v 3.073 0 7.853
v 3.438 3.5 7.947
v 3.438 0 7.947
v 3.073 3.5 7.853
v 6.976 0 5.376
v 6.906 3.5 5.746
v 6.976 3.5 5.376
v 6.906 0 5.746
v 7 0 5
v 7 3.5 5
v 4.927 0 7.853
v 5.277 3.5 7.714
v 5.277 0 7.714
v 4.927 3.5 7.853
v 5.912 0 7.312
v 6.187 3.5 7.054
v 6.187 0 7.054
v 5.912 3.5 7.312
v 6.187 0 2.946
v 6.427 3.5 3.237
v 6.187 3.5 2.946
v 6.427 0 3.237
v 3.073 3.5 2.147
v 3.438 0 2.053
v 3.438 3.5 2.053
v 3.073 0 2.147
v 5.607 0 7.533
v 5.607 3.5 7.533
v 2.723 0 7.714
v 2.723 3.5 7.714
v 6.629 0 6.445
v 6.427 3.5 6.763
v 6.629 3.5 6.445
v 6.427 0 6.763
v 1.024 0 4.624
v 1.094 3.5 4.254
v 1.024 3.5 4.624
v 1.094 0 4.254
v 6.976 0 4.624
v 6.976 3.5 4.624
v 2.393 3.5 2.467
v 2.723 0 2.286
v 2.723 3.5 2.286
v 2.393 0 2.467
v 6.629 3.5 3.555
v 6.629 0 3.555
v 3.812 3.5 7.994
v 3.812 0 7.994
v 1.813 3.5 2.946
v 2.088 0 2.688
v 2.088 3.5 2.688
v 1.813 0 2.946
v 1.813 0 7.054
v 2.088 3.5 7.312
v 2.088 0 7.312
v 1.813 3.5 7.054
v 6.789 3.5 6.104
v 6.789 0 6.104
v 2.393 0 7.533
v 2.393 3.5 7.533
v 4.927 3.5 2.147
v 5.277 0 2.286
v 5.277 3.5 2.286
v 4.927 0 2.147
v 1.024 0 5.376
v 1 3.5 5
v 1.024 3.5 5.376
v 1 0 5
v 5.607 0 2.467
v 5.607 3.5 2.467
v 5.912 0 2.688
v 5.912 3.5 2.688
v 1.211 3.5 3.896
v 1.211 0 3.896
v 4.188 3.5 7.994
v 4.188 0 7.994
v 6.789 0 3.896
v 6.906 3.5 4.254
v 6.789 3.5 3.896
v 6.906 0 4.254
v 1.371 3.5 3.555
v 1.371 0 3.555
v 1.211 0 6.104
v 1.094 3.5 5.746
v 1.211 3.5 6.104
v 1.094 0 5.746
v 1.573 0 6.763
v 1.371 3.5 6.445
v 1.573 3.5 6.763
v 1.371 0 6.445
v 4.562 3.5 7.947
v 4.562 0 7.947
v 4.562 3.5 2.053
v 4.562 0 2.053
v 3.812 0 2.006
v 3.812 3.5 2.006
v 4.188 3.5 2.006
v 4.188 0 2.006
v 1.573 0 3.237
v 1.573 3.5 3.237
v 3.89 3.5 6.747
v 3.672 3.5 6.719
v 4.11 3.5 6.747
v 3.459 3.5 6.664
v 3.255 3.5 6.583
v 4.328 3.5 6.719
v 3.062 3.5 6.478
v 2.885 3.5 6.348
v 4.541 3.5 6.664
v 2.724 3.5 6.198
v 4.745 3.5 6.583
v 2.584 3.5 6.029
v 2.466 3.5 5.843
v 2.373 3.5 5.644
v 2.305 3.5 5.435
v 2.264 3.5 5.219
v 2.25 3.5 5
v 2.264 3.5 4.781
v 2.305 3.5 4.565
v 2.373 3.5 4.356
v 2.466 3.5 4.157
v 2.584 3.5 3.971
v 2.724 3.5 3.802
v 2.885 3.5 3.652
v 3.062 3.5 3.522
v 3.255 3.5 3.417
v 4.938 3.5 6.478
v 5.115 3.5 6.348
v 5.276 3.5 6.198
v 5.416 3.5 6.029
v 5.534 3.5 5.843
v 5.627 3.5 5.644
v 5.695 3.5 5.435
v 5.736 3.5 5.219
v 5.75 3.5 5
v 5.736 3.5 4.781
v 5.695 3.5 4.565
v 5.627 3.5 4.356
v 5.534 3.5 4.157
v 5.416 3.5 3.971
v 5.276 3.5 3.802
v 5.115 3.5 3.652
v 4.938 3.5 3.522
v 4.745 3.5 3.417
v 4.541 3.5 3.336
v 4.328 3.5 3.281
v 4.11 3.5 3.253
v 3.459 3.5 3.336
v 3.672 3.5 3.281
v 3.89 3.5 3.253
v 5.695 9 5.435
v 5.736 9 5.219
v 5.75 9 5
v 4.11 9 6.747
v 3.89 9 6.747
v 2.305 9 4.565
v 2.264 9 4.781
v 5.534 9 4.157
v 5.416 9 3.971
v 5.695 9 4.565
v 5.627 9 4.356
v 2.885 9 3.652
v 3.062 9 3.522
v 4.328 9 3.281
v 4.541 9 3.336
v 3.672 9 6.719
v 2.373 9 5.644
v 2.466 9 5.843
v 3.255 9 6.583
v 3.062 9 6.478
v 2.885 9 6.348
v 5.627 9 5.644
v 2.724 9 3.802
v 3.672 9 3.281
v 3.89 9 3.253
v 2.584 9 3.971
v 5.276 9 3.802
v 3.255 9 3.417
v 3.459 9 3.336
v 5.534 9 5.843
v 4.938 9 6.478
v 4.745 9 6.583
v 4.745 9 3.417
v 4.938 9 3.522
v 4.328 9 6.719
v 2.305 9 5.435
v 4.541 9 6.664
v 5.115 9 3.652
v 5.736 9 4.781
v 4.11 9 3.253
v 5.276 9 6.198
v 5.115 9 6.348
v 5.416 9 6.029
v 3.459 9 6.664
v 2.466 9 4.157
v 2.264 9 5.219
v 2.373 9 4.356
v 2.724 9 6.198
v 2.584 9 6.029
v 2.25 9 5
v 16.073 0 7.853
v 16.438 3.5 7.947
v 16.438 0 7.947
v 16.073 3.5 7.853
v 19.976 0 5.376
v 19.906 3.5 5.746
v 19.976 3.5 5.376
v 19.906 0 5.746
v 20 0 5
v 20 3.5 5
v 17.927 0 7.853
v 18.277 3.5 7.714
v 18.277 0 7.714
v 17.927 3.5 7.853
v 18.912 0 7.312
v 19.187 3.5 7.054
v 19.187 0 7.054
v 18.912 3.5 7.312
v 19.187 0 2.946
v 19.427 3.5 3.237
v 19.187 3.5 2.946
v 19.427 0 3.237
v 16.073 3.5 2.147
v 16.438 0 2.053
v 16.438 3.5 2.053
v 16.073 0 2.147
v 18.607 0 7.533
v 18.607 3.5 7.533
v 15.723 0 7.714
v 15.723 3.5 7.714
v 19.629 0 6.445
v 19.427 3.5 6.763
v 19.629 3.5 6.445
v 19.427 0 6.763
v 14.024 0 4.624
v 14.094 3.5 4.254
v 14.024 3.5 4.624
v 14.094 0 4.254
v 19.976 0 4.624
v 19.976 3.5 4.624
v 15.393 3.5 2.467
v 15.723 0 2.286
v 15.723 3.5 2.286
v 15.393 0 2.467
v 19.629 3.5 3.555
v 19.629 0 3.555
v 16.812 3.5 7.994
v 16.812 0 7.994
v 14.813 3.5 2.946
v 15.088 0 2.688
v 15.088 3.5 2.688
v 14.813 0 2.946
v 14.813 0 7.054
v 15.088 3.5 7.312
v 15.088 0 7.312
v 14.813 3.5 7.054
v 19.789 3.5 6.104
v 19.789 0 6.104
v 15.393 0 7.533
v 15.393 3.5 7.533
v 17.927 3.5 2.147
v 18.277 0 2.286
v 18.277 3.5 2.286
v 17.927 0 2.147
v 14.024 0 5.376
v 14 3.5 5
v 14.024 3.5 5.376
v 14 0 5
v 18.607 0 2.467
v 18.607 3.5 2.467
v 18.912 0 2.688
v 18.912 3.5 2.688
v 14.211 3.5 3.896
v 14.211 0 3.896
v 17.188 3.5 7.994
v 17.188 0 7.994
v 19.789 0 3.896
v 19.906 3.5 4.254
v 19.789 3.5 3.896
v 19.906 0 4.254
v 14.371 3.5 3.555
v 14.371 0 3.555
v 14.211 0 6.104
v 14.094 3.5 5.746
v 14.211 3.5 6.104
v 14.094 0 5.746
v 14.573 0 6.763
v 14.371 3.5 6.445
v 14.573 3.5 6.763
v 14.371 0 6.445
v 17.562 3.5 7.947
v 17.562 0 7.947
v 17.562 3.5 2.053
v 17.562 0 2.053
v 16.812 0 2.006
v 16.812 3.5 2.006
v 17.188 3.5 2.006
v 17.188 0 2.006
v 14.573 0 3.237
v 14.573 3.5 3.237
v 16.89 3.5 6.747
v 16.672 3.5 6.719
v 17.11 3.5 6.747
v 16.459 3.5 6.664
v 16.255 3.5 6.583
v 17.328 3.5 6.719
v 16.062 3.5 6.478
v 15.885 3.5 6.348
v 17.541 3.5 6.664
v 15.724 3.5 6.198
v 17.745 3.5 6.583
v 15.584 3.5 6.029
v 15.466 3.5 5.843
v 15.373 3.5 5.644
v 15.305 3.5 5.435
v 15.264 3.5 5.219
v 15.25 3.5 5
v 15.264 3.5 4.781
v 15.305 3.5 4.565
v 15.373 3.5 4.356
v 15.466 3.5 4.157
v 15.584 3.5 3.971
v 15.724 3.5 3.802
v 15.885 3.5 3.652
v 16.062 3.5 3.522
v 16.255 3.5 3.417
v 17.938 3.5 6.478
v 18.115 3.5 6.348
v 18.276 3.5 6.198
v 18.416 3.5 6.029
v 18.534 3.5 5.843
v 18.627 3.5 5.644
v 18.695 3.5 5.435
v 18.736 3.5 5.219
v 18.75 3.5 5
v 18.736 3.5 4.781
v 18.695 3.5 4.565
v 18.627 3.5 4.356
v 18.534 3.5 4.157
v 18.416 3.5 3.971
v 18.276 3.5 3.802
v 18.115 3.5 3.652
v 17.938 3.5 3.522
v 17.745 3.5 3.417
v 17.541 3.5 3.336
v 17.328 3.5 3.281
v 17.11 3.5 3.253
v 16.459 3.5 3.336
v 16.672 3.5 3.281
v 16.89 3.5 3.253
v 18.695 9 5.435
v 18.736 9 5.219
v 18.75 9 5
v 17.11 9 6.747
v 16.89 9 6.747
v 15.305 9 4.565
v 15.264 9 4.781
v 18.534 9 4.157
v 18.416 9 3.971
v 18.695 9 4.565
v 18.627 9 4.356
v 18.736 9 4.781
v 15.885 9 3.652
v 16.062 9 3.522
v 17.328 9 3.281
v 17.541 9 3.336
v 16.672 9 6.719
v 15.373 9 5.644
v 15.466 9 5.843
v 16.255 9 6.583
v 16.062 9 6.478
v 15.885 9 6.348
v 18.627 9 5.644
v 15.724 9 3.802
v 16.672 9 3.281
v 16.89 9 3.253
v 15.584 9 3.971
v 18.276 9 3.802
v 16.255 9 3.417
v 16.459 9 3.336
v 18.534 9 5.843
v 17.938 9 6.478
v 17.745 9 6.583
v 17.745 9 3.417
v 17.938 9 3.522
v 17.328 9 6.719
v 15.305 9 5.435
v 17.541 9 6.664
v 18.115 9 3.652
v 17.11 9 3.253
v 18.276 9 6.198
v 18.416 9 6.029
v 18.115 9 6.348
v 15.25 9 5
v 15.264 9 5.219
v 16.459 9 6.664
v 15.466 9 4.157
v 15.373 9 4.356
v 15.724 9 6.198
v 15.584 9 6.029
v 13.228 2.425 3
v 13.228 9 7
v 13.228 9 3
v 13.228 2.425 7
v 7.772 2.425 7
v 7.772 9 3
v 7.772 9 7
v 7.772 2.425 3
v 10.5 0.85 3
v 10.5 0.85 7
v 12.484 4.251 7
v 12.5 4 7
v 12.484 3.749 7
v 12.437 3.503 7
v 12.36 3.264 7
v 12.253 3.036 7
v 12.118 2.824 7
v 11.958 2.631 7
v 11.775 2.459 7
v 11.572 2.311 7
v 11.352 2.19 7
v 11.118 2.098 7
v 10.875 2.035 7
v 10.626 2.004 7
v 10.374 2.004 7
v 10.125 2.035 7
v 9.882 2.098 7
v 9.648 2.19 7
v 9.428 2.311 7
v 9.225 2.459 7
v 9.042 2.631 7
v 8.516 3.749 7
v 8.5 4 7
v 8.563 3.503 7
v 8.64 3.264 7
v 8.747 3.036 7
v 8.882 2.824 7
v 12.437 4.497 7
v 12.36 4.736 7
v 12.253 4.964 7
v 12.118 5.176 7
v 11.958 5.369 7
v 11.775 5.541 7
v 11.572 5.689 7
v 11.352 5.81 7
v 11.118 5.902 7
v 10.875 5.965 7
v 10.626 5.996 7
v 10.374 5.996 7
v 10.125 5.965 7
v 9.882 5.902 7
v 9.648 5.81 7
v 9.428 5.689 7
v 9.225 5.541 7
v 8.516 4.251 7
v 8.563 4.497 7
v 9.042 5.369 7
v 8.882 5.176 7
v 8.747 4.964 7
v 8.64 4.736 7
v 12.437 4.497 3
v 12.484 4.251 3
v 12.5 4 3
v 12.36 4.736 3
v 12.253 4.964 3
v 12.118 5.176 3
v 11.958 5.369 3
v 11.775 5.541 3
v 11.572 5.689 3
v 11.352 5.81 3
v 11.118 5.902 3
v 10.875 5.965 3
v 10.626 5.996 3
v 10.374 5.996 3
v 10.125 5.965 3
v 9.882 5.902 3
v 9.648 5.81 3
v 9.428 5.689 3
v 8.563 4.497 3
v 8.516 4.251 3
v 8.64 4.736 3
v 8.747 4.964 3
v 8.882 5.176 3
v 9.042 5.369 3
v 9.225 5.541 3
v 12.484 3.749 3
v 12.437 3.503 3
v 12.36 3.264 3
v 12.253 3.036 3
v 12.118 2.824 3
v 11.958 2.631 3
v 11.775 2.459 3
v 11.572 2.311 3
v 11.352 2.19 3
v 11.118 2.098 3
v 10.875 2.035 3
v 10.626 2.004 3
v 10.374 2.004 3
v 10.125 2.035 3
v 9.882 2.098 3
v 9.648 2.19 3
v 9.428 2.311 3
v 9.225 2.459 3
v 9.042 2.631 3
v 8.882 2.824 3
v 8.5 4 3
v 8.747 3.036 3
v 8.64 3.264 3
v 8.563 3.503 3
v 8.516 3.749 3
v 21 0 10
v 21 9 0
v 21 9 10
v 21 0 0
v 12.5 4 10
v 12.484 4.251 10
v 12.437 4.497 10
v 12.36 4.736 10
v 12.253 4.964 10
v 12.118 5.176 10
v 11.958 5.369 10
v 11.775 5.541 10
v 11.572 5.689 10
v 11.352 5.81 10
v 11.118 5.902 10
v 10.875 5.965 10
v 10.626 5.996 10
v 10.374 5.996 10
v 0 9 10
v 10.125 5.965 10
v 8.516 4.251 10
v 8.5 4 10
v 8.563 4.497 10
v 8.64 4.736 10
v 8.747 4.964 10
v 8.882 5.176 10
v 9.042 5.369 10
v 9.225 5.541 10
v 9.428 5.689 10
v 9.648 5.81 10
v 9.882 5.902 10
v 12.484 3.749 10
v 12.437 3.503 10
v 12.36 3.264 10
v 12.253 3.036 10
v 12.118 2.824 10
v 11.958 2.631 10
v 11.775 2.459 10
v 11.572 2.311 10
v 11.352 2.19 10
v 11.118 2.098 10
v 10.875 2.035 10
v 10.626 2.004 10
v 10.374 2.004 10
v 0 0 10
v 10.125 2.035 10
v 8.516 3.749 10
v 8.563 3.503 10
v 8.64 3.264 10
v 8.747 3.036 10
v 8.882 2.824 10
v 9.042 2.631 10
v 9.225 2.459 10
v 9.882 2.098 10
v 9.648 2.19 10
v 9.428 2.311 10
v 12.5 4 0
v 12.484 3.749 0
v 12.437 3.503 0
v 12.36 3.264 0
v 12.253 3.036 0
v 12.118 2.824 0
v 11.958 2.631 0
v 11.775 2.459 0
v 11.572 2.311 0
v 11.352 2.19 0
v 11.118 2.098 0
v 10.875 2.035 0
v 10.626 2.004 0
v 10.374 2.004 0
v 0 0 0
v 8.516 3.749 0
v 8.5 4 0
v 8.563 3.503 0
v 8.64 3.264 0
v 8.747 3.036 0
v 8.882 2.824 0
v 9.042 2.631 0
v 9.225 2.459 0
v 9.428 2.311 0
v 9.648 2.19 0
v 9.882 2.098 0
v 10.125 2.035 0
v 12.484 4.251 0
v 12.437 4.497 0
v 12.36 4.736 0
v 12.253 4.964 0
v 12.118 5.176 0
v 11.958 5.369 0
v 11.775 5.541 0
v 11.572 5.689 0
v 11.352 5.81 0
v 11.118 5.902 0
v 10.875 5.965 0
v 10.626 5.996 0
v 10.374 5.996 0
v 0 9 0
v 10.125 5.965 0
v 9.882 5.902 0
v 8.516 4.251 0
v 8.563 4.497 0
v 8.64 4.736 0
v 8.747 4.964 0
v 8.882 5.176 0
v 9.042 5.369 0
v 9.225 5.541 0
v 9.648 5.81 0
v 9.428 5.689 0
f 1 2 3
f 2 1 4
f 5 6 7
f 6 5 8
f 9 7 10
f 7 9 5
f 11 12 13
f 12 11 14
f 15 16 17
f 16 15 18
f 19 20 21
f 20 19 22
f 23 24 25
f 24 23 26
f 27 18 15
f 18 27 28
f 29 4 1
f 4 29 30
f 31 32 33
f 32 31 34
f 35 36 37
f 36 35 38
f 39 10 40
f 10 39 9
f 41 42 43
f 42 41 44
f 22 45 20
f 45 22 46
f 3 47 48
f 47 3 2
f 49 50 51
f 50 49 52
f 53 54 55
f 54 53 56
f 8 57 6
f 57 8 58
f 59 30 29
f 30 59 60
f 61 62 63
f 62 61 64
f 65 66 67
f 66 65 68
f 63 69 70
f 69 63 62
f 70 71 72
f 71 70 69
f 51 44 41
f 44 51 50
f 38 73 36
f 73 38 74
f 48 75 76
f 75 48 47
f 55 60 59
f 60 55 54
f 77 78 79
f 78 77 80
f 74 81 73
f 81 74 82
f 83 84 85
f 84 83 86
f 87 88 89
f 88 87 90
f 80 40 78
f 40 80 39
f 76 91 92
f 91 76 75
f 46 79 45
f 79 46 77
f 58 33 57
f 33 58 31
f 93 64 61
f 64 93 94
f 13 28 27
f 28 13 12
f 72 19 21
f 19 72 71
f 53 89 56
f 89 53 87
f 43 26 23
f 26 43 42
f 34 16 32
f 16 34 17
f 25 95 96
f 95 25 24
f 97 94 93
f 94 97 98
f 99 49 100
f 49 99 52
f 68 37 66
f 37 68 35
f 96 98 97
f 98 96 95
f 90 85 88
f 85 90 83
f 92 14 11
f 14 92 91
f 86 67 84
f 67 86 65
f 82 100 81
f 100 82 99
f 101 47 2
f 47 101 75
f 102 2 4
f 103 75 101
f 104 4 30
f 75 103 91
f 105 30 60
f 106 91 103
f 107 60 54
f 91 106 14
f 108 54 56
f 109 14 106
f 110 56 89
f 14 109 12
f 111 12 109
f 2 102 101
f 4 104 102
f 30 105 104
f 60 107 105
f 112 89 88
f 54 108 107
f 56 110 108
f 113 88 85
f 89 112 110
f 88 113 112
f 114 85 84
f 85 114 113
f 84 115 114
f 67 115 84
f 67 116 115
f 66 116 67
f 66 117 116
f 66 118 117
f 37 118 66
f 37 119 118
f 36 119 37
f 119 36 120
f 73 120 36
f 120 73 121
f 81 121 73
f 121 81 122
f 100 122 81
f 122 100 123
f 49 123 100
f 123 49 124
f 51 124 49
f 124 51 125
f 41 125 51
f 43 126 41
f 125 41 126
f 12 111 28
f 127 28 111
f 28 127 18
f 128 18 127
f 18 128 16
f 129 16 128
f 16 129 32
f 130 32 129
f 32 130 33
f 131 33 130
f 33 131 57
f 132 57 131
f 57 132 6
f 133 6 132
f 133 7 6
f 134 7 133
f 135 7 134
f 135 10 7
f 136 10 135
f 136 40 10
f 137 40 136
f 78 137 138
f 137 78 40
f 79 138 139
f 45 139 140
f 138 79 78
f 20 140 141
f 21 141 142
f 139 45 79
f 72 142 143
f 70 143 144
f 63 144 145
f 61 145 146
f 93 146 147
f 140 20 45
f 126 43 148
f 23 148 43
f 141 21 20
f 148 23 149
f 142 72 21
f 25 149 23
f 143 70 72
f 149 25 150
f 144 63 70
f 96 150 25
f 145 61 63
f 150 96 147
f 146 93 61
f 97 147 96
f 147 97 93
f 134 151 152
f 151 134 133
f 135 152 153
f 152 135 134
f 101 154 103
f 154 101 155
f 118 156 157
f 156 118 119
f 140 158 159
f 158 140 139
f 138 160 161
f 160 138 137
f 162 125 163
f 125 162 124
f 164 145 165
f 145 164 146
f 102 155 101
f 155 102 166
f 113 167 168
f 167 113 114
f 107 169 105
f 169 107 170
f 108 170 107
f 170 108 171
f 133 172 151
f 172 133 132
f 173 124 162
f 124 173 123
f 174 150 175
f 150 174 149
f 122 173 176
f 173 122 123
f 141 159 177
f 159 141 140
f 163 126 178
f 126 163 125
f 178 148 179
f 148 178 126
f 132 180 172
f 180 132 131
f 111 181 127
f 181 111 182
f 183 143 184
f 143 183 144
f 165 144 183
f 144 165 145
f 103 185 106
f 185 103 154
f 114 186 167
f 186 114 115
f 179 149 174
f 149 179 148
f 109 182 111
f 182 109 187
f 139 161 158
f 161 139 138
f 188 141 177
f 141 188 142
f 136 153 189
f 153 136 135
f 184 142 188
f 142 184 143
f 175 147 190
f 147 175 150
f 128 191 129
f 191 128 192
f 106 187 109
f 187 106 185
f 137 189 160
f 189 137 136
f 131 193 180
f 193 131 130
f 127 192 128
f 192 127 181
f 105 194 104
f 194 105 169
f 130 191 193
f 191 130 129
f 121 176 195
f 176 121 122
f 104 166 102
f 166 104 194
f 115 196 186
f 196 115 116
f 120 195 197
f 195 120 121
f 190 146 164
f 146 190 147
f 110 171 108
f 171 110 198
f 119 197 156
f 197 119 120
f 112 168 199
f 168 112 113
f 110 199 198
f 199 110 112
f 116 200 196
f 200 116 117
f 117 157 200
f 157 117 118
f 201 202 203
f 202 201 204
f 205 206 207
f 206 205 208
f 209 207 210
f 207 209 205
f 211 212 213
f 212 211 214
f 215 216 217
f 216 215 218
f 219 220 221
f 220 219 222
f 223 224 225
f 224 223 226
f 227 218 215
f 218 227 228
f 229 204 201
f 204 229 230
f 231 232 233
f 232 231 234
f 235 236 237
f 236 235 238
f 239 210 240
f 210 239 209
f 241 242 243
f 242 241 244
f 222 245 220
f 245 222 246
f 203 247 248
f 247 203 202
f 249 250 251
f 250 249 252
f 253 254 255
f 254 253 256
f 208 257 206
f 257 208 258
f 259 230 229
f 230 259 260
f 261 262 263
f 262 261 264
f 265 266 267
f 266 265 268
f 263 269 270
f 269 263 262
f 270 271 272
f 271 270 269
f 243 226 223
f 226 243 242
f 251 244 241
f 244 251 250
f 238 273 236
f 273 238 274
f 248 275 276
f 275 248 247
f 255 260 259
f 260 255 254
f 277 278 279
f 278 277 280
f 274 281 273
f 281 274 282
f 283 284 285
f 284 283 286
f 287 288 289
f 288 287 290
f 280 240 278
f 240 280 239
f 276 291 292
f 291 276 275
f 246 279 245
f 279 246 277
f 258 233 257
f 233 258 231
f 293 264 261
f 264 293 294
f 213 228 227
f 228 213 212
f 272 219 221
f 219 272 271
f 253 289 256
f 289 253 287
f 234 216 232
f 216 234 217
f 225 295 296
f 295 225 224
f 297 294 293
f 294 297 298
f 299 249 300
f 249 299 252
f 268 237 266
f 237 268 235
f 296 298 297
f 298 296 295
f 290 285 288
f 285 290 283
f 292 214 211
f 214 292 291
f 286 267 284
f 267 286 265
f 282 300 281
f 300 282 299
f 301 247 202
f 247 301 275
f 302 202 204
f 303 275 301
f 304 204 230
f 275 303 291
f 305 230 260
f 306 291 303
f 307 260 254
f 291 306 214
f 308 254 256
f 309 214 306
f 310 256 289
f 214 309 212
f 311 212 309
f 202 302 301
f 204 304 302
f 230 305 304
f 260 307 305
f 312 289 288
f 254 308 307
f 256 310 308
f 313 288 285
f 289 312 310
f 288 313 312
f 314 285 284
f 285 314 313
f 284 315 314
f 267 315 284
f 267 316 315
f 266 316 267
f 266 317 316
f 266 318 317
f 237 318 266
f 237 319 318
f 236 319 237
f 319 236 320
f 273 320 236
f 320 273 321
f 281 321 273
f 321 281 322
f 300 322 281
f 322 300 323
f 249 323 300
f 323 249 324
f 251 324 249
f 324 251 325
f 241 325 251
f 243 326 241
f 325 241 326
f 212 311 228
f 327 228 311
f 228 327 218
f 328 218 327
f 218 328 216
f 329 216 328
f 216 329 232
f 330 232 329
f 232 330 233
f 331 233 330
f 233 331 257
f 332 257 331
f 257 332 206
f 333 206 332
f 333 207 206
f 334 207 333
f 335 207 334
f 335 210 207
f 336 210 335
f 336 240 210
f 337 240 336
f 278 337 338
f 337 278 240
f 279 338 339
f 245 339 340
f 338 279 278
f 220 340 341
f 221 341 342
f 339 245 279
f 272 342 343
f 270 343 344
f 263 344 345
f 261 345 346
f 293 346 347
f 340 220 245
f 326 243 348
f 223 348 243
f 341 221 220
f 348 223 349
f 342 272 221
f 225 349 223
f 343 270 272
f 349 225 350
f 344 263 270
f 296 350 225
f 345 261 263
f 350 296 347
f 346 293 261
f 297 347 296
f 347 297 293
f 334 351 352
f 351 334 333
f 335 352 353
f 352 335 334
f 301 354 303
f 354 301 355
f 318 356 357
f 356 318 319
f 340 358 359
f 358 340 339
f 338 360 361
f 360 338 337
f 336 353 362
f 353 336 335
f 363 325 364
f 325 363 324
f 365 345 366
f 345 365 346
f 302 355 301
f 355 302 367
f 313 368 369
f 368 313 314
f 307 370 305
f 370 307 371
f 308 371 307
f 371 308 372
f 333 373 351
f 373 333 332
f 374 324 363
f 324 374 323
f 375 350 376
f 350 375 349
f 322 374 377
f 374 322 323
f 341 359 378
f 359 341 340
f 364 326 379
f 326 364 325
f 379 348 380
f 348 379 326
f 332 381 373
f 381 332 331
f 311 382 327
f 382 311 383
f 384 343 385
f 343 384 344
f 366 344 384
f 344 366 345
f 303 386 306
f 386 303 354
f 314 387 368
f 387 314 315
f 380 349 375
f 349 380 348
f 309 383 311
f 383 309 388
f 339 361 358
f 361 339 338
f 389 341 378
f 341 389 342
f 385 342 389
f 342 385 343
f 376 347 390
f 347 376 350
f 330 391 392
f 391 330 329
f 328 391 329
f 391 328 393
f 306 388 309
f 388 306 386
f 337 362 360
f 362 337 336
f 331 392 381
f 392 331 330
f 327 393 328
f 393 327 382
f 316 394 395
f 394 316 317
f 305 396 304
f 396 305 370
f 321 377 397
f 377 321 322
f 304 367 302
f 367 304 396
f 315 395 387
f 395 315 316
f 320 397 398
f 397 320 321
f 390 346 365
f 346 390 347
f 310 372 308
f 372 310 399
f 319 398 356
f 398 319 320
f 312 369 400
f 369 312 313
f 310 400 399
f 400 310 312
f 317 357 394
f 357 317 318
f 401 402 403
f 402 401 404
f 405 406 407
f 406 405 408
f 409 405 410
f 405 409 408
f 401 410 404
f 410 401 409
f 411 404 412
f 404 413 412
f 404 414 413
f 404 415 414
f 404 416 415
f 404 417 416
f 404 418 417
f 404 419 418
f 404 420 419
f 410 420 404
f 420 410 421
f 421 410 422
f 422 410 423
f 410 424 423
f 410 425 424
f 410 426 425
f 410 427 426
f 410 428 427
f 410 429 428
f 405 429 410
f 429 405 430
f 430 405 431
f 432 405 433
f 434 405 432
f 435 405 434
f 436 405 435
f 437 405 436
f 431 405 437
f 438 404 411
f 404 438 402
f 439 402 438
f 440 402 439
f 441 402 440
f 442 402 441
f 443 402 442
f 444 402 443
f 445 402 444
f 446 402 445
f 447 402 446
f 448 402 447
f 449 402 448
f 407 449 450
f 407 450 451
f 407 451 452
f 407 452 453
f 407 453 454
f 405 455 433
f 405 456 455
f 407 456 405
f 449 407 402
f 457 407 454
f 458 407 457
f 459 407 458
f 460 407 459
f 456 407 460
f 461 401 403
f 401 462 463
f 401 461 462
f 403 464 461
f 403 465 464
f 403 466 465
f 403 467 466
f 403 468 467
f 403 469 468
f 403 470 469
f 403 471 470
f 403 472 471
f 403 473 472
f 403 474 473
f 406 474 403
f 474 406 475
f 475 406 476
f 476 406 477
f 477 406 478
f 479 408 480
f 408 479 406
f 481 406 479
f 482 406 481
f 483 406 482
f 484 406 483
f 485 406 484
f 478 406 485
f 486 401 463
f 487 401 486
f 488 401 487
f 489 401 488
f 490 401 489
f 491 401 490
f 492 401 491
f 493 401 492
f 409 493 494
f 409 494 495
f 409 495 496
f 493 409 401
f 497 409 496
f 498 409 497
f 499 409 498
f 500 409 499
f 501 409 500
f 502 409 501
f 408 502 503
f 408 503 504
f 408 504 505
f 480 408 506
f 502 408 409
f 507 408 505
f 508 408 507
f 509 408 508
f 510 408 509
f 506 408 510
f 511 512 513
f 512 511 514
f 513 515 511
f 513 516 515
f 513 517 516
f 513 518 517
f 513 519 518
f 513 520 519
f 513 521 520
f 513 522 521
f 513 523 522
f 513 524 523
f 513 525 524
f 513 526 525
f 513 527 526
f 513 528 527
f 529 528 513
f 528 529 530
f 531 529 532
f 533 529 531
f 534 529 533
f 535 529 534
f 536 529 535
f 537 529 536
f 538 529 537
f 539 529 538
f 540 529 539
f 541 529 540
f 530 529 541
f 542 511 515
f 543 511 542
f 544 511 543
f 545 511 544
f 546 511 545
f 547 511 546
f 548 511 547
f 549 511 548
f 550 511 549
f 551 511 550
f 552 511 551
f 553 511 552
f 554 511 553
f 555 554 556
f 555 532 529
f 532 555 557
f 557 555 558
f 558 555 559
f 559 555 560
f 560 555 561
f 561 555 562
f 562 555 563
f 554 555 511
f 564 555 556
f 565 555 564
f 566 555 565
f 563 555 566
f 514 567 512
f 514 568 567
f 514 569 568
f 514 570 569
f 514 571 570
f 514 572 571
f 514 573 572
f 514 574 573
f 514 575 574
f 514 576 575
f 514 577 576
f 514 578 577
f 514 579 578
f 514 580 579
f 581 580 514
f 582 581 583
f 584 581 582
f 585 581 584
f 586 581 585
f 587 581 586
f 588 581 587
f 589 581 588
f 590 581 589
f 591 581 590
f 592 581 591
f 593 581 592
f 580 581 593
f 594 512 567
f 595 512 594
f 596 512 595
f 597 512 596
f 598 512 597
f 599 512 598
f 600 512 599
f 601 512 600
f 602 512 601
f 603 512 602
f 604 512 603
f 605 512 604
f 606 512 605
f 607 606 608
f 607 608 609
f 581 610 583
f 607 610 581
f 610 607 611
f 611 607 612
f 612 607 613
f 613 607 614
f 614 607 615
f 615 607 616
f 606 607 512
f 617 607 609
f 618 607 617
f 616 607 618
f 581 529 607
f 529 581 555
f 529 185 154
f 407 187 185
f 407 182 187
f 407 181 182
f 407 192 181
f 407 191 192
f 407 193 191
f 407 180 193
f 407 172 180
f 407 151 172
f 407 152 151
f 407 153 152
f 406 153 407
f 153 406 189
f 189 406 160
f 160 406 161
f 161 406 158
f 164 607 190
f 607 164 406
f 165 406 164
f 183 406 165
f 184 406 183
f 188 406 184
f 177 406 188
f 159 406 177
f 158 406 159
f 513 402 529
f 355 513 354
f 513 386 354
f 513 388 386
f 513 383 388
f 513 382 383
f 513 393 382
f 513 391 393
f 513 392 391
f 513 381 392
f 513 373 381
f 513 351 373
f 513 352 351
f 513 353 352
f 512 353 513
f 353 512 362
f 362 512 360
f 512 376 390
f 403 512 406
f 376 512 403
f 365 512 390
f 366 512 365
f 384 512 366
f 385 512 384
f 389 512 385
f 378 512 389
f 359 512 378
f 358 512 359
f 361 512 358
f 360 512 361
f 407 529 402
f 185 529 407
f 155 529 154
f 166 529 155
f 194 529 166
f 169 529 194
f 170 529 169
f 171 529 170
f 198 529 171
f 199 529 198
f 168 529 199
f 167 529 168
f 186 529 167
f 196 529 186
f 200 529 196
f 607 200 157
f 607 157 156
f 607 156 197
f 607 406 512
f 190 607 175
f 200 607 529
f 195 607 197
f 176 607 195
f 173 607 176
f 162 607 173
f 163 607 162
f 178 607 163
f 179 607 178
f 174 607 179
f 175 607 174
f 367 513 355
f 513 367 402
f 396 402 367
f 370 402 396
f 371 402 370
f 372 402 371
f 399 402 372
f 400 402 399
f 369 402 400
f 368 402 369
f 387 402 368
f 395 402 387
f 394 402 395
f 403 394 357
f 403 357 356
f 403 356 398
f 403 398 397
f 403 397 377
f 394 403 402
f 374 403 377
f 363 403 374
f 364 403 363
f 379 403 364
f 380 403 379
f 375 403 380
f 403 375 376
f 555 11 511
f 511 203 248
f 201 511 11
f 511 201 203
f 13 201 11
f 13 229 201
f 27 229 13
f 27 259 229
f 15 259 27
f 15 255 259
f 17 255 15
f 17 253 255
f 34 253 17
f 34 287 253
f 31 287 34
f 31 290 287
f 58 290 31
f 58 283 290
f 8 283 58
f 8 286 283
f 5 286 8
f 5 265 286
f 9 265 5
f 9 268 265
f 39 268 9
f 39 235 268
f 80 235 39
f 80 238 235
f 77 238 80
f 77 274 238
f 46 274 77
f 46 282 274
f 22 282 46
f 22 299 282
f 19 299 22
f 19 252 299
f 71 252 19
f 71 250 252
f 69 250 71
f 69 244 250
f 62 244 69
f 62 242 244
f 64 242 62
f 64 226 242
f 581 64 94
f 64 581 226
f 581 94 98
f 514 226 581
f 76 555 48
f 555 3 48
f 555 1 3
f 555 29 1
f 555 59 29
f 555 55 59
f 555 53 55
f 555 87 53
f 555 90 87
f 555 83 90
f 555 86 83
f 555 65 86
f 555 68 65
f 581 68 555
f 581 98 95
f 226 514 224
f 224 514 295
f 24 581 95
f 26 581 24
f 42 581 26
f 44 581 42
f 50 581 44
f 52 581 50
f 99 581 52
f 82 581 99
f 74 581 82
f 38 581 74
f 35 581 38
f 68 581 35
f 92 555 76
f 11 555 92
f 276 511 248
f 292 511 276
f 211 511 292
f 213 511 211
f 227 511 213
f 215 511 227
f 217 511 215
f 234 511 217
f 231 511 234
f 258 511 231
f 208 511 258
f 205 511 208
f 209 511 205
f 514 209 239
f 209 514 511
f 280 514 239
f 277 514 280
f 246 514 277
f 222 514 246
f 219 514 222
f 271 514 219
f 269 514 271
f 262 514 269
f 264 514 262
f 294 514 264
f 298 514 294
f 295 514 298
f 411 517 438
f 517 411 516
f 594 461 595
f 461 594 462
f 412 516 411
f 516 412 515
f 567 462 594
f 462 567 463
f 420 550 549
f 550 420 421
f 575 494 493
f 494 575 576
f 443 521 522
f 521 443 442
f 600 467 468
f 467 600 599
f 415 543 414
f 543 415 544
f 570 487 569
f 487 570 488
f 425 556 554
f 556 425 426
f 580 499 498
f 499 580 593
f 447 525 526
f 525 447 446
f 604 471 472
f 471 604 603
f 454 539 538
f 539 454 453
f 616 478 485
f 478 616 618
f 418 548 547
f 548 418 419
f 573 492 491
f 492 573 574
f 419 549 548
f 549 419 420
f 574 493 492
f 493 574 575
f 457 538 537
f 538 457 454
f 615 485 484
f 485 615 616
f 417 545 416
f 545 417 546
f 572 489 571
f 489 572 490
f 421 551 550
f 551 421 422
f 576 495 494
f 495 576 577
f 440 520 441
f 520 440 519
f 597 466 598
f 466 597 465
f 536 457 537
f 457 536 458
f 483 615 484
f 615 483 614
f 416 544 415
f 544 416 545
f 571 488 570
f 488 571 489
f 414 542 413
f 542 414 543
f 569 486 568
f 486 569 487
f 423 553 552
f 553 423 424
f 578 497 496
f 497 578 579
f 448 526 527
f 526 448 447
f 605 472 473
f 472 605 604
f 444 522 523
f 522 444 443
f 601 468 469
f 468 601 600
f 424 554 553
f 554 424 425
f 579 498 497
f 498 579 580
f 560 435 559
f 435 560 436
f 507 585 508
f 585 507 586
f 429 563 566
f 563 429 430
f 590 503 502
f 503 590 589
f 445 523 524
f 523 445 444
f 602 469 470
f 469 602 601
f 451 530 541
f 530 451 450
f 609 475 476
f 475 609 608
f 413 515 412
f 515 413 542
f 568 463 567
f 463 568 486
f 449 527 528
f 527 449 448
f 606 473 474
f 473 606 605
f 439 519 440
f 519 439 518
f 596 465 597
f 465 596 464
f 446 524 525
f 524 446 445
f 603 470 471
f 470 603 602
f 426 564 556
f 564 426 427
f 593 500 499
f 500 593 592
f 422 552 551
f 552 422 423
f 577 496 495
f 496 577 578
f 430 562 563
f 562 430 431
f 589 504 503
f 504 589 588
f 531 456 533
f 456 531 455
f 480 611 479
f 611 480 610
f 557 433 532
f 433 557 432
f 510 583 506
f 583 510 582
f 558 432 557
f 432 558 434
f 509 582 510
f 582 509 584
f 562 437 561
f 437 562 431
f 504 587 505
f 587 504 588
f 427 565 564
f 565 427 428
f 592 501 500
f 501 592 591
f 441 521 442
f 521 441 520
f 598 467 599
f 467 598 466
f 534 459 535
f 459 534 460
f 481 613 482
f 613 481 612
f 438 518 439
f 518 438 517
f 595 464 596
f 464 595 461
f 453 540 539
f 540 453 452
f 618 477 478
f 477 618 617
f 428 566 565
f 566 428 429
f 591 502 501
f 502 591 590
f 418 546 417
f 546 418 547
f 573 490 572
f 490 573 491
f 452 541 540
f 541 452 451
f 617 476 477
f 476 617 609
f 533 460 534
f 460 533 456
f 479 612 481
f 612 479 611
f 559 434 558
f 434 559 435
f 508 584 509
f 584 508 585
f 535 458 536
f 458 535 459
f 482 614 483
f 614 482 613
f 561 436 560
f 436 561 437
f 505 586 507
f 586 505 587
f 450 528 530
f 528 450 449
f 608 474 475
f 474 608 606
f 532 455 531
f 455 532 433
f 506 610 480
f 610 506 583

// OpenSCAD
/********************************************************
This file is part of the RepRapPNP project, developed at the University of Hamburg.

It heavily relies on the work by Jonas and Simon Kühling for the RepRap-Industrial design.

Author: Daniel Ahlers <2ahlers@informatik.uni-hamburg.de> 
Maintainer: Florens Wasserfall <wasserfall@kalanka.de> 
License: 'GNU Affero General Public License AGPLv3 http://www.gnu.org/licenses/agpl.html' 
*******************************************************/

$fn=50;

mechanical_stop(30);

module mechanical_stop(screw_length) {
    difference() {
    	t=10;
        cube([21,4+5,t]);
        translate([21/2,4,-1])cylinder(h=t+2,r=4/2);
        for(i=[-1,1]){
        	translate([21/2+i*13/2,3.5,t/2])rotate([90,0,0])cylinder(h=3.6, r=6/2, center=false);
        	translate([21/2+i*13/2,20,t/2])rotate([90,0,0])cylinder(h=40, r=3.5/2, center=false);
        }
        for(i=[0:6]) {
            translate([21/2, 4+i, t/2])rotate([0,0,90])cylinder(r=6.3/2, h=4, center=true, $fn=6);
        }

    }
    %translate([21/2,4,-4.3-5])cylinder(h=4.3,r=8.1/2);
    %translate([21/2,4,-5])cylinder(h=screw_length,r=3/2);
}
